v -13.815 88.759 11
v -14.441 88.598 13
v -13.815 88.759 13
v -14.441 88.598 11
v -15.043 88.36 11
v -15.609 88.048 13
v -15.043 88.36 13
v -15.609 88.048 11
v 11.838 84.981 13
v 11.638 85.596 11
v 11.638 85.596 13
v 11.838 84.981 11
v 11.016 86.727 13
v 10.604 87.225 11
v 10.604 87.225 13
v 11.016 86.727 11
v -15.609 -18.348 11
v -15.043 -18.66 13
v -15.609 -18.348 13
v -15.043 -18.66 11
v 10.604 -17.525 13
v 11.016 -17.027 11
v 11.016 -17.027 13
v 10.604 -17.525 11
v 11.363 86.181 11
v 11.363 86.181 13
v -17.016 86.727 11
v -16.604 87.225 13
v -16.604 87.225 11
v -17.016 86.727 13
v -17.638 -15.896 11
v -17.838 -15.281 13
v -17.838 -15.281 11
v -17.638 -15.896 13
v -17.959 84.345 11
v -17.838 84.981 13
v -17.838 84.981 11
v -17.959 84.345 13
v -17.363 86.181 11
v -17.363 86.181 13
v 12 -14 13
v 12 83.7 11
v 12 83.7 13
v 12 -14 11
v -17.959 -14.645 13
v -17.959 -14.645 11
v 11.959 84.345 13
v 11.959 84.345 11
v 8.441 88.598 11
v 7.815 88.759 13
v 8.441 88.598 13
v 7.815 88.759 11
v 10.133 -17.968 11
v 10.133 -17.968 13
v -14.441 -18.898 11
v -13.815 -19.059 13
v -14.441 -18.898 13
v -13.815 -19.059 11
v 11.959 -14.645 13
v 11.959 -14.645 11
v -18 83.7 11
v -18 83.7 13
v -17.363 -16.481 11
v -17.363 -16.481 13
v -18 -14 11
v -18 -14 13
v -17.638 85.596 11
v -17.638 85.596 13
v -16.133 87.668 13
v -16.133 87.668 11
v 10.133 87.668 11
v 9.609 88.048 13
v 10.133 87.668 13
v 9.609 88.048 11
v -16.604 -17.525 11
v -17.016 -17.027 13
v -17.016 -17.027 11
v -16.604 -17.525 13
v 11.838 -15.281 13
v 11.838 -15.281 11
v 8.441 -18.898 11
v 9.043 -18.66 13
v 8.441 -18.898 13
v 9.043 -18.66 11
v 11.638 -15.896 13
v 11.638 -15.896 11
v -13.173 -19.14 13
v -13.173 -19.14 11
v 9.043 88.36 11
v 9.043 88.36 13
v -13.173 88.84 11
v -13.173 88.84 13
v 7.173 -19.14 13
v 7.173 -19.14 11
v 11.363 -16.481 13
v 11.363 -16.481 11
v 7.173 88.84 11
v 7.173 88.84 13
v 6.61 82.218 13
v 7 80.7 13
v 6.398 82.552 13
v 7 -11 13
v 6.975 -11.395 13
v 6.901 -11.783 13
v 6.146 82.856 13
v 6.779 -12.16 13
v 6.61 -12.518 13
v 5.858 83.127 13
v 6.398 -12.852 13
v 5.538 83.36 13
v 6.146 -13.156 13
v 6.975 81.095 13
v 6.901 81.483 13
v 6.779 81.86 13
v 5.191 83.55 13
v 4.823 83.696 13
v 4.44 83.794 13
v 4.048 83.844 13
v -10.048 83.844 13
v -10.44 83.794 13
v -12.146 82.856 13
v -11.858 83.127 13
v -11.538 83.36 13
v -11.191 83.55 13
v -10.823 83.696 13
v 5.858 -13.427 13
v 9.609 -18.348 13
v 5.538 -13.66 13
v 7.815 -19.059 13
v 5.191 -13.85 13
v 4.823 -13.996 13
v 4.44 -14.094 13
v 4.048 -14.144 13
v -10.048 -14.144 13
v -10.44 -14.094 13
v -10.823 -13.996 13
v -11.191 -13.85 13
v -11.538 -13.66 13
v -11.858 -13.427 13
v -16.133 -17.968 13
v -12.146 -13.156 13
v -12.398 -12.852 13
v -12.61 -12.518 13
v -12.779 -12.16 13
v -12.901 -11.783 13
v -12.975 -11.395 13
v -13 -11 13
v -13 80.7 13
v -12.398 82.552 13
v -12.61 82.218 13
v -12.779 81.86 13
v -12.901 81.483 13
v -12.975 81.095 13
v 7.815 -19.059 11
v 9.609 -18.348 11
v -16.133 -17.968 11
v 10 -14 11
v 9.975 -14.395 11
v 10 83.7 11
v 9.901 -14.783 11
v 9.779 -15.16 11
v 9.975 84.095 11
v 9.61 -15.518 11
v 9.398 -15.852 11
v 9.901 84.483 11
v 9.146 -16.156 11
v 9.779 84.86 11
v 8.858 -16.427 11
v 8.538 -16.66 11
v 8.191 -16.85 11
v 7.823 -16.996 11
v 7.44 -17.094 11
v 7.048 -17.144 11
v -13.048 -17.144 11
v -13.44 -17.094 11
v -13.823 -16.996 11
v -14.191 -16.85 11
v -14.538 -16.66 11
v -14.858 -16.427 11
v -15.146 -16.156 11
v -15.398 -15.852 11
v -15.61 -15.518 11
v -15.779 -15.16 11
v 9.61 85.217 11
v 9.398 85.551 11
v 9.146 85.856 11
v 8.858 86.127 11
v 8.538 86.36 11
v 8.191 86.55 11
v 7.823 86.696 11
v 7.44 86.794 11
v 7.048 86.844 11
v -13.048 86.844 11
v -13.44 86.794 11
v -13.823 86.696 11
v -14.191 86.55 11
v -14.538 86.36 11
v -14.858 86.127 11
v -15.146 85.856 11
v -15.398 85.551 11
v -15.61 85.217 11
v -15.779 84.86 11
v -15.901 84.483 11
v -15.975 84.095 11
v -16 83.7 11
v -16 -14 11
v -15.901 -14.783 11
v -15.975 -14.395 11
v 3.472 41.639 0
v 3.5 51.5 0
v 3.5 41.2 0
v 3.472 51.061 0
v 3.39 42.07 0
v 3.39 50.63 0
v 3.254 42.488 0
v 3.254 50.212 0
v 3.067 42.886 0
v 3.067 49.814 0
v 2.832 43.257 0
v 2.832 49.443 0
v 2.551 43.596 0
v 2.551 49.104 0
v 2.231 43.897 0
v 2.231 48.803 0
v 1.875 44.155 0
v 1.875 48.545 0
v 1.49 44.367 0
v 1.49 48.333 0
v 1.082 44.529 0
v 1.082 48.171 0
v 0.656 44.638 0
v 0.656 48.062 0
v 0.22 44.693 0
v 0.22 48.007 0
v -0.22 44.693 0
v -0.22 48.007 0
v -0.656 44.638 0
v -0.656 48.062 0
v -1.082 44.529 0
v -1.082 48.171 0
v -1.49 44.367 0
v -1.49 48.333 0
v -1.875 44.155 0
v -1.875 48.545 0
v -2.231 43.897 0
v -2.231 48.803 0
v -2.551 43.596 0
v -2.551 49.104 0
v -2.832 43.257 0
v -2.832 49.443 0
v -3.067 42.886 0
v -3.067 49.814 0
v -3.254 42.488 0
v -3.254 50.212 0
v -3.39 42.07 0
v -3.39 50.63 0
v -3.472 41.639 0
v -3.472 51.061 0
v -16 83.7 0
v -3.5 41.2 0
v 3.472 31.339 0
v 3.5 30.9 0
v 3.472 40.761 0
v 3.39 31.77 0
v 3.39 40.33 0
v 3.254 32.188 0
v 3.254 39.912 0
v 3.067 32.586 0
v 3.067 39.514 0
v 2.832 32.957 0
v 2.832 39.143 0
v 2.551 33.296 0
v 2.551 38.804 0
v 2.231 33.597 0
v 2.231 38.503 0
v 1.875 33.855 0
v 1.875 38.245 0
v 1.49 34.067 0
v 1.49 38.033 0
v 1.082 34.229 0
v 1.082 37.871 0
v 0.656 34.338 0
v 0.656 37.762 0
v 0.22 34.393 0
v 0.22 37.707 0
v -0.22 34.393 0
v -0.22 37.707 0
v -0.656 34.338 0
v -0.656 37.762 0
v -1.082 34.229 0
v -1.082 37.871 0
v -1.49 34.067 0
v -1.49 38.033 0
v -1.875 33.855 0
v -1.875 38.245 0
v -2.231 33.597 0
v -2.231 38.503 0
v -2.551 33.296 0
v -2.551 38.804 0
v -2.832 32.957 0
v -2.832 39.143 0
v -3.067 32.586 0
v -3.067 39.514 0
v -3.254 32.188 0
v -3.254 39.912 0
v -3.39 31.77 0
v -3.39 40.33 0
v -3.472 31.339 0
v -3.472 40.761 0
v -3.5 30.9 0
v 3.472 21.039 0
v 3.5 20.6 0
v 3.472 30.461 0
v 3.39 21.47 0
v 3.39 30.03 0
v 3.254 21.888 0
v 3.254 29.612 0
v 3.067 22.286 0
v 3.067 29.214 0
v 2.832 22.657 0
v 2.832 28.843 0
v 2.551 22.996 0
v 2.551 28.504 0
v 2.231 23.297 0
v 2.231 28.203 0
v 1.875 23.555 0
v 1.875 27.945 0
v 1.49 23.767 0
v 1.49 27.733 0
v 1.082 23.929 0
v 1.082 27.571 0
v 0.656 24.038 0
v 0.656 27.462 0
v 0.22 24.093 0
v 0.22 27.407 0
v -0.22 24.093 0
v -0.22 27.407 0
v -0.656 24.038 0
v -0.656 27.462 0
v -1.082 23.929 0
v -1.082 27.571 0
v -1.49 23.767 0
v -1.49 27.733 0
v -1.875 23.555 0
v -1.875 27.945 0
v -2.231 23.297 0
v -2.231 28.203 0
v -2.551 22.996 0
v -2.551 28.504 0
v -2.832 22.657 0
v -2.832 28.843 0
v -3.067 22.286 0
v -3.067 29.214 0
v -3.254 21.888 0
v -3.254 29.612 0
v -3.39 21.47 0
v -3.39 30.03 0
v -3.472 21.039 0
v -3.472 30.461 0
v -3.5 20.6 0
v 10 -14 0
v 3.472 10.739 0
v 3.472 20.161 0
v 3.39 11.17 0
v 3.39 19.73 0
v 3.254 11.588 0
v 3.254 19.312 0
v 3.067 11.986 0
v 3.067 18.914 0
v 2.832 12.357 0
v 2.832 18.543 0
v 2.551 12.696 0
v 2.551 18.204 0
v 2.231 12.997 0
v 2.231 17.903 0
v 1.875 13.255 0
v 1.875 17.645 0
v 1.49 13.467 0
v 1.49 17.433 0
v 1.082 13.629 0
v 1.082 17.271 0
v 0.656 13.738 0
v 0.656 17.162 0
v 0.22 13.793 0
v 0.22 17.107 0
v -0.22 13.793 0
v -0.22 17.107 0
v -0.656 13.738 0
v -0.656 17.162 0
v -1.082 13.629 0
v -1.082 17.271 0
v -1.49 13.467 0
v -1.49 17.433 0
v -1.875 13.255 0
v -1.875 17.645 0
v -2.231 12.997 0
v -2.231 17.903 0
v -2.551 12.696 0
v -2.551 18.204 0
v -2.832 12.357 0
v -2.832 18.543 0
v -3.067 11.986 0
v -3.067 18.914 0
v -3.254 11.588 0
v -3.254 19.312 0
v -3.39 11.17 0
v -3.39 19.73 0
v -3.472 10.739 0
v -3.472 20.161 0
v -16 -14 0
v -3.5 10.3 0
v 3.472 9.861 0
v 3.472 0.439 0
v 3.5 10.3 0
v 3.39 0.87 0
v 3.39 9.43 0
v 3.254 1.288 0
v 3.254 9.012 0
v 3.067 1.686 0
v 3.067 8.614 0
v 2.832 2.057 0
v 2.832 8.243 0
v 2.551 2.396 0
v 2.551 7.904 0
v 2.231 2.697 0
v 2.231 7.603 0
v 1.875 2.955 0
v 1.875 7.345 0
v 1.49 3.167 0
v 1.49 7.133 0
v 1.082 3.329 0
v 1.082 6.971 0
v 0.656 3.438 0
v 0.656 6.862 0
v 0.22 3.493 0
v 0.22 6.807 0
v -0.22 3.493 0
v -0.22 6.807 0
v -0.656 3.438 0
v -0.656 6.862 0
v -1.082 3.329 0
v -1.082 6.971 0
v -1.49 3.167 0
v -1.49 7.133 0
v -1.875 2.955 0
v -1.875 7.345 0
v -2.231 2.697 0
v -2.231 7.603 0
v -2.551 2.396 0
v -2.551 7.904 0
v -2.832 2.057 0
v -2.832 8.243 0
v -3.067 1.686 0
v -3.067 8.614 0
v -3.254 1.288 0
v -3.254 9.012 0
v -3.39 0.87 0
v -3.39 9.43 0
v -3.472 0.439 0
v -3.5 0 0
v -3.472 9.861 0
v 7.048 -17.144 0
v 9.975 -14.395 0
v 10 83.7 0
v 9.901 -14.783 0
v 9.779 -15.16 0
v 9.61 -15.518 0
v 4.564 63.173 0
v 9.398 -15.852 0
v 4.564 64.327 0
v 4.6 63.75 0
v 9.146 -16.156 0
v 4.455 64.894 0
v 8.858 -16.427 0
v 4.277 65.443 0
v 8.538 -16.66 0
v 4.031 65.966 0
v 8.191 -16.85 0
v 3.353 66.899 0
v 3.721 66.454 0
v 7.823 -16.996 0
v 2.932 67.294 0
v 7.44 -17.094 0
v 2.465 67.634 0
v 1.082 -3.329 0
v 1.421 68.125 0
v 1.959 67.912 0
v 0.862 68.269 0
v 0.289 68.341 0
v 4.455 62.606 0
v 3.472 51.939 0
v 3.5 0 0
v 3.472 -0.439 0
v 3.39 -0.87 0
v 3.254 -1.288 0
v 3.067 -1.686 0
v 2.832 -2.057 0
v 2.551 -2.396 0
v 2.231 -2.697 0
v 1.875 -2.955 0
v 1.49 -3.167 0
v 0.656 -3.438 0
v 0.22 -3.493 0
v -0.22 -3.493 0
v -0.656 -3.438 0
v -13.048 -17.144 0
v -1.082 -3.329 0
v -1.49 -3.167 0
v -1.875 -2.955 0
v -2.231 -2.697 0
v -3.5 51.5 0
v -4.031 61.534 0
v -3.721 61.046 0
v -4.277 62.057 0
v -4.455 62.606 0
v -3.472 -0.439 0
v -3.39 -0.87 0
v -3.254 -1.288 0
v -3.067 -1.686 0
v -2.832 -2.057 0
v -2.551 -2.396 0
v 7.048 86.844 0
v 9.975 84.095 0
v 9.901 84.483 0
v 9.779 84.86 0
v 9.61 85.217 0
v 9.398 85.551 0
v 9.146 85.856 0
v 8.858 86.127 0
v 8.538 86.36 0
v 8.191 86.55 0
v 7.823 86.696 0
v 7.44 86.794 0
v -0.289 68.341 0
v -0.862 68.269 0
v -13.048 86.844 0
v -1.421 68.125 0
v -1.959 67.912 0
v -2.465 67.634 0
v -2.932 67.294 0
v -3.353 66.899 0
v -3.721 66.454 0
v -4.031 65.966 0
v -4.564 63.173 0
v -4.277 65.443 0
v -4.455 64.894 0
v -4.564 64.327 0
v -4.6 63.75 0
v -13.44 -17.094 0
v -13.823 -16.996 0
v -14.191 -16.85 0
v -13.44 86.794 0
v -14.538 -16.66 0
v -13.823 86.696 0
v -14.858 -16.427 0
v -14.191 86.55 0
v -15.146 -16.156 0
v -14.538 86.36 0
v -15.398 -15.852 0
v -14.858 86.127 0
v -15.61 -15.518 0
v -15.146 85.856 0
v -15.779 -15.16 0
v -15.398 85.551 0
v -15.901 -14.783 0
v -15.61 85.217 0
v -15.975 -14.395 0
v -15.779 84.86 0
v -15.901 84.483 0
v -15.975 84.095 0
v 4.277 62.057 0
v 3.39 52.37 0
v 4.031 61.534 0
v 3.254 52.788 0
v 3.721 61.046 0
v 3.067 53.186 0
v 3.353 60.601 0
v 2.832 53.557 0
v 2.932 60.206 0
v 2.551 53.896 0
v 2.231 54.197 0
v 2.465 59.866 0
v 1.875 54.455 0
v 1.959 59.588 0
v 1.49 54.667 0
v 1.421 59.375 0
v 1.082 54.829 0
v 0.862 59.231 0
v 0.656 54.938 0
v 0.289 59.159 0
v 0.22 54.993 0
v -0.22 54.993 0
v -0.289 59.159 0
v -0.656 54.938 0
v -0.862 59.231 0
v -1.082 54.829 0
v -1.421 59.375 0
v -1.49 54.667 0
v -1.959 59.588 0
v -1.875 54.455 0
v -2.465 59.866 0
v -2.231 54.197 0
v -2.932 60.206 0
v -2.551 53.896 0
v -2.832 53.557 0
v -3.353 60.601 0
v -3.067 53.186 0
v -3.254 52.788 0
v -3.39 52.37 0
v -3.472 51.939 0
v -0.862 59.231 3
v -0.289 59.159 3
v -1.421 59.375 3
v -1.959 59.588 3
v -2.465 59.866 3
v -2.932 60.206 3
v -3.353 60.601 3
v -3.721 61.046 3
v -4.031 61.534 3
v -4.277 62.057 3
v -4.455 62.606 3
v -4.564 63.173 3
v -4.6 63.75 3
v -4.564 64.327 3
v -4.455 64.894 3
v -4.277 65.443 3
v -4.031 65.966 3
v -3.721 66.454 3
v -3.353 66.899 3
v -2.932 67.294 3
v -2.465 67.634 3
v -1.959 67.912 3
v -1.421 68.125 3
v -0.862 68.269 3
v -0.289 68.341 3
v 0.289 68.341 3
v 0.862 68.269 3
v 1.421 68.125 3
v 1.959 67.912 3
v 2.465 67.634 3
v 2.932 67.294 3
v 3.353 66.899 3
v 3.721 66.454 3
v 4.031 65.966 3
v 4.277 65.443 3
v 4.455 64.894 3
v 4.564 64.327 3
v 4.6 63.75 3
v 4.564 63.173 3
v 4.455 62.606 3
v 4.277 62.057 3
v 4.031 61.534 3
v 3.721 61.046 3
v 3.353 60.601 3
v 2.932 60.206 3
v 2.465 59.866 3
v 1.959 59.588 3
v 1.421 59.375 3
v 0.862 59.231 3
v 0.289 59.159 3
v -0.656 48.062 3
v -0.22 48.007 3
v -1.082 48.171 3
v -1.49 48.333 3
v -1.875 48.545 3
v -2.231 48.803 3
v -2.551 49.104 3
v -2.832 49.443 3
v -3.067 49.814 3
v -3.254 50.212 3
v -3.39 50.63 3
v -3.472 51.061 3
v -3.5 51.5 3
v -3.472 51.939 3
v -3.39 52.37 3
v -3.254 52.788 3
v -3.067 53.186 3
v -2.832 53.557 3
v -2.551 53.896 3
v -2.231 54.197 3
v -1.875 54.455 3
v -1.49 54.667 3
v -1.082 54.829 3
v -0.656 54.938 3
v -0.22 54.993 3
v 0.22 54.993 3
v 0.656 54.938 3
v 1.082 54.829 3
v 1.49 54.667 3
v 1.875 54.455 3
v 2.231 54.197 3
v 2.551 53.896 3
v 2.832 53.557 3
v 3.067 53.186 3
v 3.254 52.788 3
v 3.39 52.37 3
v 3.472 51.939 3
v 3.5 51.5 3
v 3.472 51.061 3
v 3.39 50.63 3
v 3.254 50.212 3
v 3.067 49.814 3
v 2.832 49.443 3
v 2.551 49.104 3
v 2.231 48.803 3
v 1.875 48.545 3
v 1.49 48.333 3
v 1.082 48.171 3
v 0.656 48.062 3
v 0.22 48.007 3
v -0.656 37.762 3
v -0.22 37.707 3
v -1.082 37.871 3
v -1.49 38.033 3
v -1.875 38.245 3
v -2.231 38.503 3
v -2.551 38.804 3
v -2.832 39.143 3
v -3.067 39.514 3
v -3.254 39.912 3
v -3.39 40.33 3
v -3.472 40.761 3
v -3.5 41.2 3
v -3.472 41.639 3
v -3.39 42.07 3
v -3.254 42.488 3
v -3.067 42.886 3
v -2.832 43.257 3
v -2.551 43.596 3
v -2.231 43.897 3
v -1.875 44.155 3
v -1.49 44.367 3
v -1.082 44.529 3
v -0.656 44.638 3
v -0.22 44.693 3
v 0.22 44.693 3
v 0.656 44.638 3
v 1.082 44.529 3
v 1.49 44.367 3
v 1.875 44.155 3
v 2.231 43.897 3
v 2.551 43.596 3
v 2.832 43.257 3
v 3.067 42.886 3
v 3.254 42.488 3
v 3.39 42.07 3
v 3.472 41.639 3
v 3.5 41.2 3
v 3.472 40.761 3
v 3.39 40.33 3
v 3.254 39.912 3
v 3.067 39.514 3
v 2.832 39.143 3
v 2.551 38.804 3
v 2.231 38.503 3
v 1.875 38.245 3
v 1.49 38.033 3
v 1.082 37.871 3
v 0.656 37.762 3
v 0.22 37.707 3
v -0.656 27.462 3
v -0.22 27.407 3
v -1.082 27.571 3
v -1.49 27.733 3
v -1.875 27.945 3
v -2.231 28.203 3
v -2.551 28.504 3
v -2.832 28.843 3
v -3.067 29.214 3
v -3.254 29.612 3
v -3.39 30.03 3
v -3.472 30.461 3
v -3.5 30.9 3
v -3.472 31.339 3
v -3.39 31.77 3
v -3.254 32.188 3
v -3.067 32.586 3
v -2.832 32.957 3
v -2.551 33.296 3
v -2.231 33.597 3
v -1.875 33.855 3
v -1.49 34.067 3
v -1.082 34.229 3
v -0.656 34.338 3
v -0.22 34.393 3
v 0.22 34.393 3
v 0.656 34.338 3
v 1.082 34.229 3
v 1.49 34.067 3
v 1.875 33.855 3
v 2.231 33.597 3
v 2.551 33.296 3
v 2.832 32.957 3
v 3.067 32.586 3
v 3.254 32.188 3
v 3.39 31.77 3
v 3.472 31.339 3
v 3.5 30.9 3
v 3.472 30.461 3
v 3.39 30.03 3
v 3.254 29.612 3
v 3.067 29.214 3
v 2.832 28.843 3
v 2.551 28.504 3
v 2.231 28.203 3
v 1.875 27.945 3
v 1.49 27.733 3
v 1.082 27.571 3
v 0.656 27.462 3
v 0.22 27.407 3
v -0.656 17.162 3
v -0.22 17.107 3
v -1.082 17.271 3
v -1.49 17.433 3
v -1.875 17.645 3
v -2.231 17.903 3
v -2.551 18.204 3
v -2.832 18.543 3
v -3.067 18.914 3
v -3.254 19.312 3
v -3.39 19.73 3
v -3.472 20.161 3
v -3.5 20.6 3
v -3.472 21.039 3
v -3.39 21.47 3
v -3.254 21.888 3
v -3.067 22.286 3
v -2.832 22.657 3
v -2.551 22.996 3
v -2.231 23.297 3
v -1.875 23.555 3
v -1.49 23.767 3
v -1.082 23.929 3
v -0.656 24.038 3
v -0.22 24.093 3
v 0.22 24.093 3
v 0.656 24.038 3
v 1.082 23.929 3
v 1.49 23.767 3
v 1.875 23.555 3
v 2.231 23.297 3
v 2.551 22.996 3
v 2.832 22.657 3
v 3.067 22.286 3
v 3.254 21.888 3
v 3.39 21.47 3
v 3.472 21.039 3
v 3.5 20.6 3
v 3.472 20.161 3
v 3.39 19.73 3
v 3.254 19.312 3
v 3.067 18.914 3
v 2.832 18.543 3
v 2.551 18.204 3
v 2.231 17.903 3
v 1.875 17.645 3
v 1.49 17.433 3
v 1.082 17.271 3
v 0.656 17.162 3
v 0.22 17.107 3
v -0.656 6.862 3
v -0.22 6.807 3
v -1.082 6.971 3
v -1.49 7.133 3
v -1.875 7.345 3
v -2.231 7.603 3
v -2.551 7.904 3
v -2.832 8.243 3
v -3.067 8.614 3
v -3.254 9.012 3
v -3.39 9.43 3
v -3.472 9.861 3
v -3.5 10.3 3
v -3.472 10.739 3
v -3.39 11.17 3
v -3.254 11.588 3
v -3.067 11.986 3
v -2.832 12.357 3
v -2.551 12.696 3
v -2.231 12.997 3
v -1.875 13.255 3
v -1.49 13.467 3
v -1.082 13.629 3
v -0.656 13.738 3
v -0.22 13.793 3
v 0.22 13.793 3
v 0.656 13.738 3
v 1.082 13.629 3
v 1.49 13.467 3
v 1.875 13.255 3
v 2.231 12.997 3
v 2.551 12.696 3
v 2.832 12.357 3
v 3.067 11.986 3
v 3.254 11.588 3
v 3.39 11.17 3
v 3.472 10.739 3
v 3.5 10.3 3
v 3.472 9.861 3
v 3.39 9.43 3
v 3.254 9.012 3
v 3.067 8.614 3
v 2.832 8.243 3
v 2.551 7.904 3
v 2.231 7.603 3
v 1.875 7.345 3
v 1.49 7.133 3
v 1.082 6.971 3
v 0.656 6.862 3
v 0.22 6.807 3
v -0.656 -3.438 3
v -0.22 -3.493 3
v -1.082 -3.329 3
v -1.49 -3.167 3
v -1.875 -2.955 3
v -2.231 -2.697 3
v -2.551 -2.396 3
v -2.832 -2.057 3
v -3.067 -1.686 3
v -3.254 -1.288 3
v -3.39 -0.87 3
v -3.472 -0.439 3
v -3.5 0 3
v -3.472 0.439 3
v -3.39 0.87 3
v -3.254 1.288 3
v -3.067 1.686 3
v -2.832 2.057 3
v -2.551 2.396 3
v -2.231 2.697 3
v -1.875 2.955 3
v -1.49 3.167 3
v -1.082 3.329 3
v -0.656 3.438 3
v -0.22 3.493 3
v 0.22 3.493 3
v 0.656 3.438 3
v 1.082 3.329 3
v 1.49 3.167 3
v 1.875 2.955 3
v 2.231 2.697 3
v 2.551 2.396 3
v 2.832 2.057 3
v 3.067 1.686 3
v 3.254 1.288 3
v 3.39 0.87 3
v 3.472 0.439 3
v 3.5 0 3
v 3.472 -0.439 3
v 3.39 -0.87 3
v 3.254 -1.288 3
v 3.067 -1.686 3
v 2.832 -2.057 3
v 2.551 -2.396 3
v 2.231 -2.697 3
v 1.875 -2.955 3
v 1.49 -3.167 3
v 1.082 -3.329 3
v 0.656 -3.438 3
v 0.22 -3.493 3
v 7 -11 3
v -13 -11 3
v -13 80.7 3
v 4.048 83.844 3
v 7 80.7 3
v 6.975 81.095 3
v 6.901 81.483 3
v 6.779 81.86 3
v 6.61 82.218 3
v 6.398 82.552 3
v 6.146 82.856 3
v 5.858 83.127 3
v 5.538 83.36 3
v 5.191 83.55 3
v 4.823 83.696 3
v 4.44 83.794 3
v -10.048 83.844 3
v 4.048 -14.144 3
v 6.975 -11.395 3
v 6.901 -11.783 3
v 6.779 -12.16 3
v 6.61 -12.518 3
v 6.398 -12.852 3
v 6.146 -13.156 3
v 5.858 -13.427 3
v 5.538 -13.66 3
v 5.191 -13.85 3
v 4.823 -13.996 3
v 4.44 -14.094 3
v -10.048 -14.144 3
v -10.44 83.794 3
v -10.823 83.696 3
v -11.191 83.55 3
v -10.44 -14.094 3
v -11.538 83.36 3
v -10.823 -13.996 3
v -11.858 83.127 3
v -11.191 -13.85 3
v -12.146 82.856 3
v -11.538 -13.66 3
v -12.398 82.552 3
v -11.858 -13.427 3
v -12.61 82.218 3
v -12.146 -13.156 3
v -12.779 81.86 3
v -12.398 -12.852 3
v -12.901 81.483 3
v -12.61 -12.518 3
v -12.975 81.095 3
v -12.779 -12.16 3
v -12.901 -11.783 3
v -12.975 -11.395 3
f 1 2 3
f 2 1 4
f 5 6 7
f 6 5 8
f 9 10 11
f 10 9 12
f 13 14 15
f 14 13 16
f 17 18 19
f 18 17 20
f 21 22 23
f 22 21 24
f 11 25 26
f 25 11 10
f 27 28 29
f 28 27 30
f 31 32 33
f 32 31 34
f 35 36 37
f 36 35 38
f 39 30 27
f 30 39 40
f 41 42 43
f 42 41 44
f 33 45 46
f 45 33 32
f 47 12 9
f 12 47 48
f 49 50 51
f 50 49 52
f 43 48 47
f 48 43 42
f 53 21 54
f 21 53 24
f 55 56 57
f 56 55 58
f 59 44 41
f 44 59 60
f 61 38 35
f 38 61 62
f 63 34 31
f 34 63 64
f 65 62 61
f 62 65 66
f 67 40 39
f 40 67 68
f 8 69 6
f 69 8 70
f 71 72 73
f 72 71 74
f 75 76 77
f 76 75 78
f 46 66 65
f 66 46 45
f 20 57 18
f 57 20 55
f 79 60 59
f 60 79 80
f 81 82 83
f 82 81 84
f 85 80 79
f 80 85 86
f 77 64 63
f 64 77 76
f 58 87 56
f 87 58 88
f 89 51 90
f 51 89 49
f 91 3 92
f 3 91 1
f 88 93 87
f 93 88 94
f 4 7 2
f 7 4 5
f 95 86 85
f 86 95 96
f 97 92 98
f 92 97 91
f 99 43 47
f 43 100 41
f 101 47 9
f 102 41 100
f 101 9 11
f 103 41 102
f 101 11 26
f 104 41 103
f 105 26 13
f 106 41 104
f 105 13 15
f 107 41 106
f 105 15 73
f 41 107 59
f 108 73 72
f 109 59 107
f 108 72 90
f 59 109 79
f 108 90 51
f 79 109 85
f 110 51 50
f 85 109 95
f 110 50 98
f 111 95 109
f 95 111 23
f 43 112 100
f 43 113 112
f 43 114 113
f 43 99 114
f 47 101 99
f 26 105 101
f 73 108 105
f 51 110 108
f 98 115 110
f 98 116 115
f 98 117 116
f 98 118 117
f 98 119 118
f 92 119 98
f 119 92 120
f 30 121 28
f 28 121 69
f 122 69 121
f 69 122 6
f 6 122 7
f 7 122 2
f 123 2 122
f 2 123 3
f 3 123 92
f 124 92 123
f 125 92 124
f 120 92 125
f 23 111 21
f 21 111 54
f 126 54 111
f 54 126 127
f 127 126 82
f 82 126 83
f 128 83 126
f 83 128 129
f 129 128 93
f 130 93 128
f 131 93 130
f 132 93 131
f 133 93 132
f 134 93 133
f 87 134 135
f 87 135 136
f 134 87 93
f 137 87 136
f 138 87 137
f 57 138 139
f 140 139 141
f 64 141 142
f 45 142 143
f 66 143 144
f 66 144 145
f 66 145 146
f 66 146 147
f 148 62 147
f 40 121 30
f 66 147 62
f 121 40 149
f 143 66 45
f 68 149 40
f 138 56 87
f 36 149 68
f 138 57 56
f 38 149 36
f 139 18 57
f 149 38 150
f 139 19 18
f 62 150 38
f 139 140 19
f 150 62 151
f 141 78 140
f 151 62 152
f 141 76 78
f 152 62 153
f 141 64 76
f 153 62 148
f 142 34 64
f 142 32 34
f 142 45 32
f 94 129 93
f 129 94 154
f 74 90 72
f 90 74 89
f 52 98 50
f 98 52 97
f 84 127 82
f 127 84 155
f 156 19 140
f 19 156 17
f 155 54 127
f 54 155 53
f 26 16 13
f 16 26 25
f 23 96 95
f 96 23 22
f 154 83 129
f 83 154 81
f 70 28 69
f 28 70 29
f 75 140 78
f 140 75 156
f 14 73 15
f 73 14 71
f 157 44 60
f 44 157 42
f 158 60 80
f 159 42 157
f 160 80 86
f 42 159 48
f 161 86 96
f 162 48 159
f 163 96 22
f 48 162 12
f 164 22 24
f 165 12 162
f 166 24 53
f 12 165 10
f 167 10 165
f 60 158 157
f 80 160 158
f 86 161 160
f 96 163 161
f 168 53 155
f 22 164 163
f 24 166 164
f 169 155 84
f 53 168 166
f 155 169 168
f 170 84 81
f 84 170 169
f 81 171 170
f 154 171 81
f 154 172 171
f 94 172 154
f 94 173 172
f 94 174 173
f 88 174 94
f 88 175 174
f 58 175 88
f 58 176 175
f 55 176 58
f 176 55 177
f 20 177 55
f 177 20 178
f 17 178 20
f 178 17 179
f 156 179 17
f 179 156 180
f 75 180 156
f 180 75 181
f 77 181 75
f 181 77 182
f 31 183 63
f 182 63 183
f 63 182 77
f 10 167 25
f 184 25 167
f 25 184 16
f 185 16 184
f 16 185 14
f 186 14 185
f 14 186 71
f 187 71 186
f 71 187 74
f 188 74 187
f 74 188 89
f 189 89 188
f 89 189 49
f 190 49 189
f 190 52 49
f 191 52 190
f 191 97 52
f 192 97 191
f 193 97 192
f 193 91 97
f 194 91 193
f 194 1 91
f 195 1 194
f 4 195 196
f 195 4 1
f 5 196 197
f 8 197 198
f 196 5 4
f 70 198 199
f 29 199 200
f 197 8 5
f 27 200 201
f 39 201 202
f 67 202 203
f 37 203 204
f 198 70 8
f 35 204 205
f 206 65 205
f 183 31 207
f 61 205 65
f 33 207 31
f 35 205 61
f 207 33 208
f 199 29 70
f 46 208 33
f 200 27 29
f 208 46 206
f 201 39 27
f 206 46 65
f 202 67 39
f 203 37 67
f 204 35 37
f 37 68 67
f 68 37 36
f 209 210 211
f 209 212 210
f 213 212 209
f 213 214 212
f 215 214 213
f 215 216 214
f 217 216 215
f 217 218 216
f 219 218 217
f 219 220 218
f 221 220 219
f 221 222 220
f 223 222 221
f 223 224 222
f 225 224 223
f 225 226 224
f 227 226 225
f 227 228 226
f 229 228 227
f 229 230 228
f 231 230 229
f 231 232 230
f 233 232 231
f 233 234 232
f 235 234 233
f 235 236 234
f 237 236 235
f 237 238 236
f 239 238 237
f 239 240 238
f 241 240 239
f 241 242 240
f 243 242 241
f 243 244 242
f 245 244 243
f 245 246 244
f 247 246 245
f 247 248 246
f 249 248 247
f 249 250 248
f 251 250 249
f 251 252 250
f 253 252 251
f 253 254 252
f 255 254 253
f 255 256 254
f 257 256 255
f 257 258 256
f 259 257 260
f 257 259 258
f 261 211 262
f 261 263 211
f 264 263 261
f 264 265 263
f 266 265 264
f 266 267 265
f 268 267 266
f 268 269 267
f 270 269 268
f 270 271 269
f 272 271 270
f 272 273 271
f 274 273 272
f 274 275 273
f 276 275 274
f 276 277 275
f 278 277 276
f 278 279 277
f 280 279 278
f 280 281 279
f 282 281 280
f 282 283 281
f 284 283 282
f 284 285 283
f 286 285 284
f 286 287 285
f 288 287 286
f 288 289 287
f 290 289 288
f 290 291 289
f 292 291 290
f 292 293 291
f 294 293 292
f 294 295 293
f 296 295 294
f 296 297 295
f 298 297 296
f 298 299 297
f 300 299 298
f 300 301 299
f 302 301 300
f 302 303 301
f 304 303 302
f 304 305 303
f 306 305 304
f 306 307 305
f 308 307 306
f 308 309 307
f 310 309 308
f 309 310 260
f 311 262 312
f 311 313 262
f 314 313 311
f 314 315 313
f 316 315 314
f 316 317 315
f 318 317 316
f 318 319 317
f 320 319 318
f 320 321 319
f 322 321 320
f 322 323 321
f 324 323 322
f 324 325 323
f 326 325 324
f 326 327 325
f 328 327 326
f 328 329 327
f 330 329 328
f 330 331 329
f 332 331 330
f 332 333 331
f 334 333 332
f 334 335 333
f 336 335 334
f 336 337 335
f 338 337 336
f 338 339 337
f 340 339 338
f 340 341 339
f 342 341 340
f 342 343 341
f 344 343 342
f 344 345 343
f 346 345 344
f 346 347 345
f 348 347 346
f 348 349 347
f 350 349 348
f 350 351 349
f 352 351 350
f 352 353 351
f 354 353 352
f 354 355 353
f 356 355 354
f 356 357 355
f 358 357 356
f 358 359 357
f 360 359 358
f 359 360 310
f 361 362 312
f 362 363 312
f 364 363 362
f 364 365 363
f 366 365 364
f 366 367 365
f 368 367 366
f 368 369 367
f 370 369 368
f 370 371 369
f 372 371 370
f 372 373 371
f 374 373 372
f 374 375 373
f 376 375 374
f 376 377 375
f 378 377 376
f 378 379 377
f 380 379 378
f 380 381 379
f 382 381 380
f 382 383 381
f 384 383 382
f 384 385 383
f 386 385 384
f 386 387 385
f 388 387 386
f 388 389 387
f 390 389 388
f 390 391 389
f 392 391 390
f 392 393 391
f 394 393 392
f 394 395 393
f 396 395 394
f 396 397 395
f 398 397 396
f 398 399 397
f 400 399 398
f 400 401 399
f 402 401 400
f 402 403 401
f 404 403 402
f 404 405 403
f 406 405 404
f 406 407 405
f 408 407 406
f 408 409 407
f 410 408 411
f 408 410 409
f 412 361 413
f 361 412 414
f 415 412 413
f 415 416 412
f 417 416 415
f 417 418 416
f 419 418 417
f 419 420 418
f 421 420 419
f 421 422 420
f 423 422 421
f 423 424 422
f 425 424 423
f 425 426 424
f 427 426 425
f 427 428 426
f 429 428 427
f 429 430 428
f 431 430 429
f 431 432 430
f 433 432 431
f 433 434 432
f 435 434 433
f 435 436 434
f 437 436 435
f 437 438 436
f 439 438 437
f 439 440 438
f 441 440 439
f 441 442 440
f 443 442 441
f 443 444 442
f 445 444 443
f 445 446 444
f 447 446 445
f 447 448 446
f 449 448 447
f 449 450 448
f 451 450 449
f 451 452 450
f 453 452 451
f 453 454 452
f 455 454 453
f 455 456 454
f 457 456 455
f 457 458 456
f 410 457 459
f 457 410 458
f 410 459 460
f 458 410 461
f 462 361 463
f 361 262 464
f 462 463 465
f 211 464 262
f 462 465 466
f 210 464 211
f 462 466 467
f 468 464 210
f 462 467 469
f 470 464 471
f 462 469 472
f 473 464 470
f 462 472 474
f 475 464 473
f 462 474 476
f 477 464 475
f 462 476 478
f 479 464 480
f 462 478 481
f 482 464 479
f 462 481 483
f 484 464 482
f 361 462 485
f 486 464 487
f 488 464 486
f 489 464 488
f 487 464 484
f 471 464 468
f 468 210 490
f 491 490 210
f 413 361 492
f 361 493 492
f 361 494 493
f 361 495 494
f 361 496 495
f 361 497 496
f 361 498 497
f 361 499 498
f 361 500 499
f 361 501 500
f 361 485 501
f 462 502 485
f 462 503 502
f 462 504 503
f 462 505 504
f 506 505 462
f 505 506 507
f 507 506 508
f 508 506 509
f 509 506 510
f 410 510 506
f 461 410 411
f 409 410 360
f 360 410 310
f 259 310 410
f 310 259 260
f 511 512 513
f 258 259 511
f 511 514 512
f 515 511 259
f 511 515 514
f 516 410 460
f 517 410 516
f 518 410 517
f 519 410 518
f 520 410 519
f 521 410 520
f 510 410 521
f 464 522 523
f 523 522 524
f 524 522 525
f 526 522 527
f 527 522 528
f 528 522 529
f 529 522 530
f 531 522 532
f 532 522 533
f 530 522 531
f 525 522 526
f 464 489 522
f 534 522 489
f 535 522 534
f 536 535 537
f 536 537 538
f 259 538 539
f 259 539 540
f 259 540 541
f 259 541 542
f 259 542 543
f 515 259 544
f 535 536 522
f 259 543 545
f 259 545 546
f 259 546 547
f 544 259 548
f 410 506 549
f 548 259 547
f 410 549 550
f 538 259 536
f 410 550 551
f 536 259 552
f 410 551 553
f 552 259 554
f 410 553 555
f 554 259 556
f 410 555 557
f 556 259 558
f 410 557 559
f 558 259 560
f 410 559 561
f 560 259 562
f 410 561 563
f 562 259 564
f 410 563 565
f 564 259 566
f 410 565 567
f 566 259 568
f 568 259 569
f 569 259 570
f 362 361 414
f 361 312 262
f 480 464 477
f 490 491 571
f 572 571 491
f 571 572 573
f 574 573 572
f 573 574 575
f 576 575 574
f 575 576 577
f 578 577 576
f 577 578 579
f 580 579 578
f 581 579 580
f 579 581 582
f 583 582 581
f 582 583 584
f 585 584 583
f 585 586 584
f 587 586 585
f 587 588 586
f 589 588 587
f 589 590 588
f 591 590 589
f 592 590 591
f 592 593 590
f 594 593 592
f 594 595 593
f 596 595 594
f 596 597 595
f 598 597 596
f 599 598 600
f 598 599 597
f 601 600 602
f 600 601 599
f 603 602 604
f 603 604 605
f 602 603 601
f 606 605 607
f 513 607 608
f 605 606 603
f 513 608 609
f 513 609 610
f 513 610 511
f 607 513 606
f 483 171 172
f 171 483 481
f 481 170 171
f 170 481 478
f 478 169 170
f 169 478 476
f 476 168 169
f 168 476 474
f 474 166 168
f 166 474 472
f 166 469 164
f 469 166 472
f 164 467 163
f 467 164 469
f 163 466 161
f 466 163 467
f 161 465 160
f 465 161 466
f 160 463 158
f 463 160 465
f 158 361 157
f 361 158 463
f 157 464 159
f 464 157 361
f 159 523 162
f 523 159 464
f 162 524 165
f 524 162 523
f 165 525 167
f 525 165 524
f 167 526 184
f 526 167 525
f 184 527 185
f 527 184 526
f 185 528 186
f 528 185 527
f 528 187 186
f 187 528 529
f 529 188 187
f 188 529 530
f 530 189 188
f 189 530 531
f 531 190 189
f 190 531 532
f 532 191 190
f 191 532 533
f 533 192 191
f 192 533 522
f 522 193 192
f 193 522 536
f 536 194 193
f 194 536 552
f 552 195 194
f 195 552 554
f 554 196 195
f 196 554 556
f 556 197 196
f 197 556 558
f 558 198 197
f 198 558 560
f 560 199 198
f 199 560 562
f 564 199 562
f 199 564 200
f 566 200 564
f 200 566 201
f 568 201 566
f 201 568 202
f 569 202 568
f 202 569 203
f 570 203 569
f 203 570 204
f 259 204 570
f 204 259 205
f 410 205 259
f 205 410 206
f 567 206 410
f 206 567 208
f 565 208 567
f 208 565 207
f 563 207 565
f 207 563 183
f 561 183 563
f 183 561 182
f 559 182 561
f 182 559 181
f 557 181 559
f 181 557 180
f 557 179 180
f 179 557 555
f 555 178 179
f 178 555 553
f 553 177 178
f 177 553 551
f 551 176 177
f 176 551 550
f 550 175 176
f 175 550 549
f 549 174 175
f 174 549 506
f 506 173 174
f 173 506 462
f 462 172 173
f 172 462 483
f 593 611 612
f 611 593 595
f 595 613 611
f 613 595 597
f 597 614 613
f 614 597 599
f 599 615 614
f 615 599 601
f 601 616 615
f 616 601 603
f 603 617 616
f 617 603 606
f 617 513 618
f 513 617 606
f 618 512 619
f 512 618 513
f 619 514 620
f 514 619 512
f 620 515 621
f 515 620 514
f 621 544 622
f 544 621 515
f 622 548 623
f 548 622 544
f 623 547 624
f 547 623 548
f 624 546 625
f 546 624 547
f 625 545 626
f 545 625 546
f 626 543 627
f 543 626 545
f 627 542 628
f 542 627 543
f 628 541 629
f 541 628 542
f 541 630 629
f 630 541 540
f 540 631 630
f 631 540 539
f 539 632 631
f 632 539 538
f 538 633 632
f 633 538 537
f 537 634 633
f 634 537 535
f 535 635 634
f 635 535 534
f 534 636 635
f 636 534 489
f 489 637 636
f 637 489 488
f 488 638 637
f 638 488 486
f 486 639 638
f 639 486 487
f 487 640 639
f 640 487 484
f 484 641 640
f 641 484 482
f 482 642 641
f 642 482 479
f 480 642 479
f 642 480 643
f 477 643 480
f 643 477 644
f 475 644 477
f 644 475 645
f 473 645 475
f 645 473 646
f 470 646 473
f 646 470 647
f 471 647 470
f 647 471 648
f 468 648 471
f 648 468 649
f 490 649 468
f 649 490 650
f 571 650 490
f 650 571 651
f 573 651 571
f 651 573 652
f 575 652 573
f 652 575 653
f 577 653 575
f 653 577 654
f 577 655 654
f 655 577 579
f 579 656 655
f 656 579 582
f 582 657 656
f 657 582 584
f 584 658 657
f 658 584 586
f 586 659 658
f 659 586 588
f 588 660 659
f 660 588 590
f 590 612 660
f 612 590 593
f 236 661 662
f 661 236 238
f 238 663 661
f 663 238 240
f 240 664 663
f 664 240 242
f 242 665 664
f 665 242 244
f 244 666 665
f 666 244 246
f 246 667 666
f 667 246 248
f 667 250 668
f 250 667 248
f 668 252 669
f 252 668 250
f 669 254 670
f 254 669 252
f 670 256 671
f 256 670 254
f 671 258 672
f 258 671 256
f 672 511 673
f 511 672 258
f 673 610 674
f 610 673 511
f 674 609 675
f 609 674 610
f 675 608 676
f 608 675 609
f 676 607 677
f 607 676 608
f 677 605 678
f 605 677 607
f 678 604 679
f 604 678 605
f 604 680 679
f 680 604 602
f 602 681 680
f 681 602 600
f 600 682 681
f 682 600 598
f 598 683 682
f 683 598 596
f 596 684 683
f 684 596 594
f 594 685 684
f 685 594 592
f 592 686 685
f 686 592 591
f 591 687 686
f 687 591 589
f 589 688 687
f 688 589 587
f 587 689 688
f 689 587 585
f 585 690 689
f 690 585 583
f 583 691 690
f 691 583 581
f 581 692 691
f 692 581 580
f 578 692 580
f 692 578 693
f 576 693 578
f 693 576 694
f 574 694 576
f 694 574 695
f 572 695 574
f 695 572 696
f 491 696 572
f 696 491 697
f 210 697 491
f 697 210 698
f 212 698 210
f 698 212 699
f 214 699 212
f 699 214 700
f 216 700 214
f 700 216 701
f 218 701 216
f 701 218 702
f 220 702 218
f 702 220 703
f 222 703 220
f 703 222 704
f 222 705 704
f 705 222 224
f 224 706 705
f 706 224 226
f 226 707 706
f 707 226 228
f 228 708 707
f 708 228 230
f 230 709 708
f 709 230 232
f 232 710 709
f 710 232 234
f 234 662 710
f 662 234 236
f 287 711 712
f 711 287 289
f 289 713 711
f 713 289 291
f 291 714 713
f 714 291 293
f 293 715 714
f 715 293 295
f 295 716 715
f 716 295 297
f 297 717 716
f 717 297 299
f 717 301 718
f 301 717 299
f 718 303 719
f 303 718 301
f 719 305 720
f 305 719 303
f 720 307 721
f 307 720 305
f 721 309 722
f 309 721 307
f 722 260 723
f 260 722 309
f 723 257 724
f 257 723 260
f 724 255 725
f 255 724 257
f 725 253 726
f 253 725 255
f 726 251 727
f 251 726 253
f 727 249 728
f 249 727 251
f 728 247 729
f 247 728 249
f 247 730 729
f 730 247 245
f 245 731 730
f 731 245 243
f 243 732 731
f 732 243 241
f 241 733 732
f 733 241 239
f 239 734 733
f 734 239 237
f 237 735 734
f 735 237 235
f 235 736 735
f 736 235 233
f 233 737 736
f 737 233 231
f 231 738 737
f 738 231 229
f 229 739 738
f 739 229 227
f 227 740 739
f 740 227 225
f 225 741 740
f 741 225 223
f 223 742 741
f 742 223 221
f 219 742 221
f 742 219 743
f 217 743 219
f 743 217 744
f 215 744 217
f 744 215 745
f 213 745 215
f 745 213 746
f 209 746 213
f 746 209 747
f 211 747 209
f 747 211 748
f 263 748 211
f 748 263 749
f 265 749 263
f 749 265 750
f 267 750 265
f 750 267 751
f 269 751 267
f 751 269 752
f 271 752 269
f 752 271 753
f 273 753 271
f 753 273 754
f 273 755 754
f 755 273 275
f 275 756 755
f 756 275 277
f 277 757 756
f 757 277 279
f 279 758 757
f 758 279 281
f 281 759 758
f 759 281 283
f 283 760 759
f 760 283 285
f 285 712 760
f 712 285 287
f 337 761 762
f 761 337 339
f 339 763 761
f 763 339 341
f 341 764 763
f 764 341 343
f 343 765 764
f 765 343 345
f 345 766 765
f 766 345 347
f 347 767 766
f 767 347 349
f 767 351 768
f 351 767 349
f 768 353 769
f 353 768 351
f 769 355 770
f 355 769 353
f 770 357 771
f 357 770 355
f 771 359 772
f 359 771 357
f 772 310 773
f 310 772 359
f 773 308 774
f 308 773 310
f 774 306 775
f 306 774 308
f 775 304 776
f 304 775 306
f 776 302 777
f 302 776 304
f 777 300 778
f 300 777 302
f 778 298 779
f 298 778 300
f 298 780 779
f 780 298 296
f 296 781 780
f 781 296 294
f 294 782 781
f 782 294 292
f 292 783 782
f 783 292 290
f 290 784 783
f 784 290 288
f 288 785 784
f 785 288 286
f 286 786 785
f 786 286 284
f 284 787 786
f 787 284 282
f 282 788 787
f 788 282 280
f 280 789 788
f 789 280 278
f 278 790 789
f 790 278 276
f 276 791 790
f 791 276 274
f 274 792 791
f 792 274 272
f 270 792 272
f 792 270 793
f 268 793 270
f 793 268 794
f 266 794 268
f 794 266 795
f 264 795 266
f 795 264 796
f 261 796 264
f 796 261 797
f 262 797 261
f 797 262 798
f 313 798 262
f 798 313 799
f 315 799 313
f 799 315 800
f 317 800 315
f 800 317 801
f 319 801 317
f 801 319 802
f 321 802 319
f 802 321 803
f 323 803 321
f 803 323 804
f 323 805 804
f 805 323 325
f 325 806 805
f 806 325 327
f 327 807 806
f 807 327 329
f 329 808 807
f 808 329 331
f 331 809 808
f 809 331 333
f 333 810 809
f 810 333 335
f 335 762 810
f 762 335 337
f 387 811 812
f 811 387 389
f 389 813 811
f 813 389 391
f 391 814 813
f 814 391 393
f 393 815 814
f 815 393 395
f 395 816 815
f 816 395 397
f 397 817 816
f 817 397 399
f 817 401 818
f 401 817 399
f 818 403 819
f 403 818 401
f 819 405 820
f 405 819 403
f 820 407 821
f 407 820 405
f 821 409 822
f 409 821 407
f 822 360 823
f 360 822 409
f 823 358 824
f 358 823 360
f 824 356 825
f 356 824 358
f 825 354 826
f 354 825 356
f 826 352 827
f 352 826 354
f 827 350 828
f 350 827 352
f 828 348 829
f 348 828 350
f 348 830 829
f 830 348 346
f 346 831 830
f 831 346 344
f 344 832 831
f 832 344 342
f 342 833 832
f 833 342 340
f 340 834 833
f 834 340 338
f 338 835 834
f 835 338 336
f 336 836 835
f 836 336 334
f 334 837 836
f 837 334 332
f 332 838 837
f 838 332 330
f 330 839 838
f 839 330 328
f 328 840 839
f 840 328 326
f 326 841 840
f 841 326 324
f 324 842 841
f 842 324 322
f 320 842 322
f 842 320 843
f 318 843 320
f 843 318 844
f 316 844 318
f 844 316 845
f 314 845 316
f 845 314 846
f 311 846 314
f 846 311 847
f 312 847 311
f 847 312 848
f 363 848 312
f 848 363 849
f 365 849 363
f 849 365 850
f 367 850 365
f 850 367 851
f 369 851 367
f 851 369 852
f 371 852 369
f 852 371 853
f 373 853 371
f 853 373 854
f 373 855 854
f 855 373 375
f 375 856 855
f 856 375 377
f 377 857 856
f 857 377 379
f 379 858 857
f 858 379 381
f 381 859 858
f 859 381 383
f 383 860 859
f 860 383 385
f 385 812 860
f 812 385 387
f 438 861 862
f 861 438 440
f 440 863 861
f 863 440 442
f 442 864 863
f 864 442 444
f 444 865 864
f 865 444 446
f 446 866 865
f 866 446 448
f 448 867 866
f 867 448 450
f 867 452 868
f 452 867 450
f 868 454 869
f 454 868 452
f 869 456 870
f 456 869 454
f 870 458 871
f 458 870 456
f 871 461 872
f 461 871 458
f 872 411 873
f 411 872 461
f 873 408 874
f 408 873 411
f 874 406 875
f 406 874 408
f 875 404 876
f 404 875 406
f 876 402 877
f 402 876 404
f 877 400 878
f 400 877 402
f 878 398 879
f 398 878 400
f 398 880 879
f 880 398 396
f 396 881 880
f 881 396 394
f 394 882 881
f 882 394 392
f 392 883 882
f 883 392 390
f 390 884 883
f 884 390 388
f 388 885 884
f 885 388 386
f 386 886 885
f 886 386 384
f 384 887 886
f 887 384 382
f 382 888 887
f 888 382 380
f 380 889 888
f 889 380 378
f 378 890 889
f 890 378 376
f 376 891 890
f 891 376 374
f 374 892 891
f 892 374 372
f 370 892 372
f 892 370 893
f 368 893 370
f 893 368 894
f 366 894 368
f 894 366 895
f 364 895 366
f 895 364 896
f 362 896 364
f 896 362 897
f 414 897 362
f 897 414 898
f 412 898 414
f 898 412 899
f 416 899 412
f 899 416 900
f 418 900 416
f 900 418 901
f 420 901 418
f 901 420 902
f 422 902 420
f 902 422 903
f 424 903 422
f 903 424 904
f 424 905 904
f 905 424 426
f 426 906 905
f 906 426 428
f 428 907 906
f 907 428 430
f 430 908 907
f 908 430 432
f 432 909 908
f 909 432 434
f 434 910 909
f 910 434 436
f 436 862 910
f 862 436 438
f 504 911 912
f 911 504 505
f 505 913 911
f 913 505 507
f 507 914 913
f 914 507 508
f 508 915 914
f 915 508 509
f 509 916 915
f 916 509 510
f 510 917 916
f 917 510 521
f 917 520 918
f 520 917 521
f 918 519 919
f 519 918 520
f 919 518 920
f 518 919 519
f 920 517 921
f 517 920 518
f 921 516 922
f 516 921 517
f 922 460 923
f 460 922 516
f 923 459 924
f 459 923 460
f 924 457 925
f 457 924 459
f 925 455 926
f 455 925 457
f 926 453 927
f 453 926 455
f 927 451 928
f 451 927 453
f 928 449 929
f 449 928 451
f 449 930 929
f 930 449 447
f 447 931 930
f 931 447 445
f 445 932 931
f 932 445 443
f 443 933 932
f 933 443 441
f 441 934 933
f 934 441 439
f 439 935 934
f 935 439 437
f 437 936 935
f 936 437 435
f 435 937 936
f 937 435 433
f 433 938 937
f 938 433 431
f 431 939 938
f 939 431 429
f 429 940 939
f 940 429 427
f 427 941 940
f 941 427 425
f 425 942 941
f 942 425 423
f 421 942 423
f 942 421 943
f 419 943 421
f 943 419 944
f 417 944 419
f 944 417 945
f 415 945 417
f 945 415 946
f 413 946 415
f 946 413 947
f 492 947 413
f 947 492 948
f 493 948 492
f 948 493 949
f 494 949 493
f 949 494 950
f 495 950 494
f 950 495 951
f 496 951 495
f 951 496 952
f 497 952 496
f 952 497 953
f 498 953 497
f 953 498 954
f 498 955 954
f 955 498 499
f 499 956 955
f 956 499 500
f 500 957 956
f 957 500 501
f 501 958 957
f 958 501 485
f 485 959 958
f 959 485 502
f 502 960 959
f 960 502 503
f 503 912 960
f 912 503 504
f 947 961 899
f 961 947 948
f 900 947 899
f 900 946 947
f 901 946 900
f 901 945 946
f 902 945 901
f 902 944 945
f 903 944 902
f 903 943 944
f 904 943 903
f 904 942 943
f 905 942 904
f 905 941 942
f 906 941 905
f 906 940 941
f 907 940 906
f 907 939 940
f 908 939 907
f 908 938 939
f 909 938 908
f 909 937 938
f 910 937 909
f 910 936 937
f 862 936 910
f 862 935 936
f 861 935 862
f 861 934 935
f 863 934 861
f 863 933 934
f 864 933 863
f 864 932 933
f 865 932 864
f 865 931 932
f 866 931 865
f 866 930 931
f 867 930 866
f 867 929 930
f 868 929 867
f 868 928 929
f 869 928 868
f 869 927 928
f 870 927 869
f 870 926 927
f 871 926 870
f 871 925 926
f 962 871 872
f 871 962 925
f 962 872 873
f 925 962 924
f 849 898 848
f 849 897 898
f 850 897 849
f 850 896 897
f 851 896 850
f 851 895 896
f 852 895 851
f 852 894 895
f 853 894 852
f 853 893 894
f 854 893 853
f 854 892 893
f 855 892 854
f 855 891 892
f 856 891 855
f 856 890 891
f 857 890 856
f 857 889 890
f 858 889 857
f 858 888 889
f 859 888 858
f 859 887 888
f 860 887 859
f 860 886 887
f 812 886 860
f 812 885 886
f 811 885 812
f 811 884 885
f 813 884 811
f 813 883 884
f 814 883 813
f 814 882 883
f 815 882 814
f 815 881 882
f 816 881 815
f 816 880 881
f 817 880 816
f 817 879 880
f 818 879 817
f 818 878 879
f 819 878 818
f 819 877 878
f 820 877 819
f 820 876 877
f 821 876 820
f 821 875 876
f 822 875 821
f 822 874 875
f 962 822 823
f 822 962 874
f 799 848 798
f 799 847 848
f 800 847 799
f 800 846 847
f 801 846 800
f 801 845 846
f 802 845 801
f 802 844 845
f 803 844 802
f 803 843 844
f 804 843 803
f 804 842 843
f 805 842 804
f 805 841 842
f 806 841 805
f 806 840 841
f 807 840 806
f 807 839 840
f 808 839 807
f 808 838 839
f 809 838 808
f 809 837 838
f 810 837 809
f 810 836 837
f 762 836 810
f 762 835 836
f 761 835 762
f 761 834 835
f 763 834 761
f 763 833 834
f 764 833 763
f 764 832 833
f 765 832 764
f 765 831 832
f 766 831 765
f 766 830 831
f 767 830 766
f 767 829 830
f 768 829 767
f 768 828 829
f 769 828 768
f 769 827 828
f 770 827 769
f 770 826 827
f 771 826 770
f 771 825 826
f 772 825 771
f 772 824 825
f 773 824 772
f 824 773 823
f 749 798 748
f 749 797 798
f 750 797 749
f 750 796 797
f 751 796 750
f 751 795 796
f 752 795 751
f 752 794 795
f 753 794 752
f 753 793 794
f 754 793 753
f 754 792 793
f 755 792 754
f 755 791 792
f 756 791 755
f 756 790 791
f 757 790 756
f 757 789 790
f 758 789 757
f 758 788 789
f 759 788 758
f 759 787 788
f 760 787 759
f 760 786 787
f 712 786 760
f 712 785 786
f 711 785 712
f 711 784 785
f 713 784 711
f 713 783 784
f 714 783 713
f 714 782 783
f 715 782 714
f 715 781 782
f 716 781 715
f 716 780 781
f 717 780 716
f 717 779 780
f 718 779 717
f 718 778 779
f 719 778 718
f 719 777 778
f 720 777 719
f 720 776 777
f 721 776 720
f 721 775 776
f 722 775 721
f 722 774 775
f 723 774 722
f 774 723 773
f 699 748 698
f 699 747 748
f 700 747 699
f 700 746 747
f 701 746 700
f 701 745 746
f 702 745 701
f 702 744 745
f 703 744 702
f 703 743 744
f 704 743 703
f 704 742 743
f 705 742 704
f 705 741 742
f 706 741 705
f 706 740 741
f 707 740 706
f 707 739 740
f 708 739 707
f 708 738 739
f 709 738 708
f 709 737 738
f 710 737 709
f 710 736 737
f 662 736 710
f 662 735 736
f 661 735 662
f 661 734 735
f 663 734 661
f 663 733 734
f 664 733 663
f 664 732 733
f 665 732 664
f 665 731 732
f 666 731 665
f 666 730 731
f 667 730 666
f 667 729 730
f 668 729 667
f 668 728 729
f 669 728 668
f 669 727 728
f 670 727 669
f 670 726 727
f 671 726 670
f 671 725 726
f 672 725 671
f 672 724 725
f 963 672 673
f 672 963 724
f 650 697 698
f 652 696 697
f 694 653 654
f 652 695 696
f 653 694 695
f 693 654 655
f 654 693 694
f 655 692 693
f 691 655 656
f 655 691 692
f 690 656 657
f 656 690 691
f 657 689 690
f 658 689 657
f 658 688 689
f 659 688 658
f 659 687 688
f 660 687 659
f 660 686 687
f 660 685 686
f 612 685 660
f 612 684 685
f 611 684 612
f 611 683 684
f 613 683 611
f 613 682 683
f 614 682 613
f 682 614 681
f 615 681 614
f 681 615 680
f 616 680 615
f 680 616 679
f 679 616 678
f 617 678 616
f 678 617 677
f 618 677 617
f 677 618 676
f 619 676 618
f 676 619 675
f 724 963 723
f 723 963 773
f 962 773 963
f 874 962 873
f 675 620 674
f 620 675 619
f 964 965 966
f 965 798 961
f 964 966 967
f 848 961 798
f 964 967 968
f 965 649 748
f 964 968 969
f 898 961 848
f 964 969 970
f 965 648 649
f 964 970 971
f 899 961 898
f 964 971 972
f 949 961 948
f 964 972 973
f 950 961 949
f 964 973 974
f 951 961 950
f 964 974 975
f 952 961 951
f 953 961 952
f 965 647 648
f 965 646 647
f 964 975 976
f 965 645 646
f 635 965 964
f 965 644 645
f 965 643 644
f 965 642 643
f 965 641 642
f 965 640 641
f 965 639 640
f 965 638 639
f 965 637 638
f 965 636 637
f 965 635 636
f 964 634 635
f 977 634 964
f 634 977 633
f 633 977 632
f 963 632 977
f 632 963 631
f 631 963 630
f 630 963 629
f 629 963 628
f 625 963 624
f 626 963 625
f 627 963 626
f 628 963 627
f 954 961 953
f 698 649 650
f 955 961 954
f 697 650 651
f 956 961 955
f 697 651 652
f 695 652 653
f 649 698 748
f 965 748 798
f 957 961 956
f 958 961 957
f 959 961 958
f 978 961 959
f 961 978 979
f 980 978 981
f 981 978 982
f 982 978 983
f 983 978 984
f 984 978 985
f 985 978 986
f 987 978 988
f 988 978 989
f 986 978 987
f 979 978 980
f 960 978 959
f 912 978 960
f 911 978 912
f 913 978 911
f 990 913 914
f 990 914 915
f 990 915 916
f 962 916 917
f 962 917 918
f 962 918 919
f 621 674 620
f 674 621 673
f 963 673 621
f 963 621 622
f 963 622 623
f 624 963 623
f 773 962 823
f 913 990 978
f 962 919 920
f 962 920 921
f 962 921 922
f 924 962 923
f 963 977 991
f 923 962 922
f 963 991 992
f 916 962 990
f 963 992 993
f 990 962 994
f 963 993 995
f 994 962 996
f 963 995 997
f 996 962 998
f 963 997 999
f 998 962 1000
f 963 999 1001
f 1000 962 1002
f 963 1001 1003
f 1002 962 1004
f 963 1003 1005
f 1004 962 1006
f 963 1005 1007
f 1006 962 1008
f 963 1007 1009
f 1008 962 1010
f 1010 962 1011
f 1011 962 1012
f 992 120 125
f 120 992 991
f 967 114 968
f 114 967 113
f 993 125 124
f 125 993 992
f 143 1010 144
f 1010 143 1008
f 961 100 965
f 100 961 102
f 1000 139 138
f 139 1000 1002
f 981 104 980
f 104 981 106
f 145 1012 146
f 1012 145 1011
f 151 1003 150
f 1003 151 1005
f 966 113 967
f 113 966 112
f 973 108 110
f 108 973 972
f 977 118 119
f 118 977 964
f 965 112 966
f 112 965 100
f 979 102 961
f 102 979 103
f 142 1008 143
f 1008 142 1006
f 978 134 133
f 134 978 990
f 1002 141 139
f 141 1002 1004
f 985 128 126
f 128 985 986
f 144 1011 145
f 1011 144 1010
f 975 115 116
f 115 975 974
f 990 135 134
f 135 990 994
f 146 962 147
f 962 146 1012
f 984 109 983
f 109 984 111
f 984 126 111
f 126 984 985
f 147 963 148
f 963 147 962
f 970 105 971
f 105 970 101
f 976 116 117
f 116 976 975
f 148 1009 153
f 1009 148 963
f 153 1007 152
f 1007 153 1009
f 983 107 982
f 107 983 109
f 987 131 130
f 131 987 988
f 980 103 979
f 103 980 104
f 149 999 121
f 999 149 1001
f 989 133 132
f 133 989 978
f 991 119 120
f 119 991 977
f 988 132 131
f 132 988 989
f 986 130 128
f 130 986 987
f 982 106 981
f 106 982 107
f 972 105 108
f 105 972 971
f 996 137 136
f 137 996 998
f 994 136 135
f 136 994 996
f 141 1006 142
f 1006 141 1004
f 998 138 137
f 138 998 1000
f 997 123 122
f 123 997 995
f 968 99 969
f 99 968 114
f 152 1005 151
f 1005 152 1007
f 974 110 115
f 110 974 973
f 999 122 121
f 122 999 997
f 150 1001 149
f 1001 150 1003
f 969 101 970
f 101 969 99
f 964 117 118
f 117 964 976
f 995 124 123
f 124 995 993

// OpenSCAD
$fn = 50;

small_l = 58.5;
small_d = 7;

step = (small_l - small_d) / 5;

big_d = 9.2;
big_dist = 4.15;
big_pos = [0, (step * 5) + big_dist + (big_d + small_d)/2];

thickness = 3;
circle_d = 6.3;
size = [20+2*thickness-circle_d, 98+2*thickness-circle_d];
size_inside = [size.x - 2*thickness, size.y - 2*thickness];
height=11;

echo(step);


difference() {
    union() {
        translate([-3, size.y/2-14, height])
        linear_extrude(height=2)
        body(size, circle_d+4);
    
        linear_extrude(height=height)
        difference() {
            translate([-3, size.y/2-14])
            body(size, circle_d);
            for(i = [0 : 5]) {
                echo(i);
                translate([0, step * i])
                circle(d=small_d);
            }
            
            translate(big_pos)
            circle(d=big_d);
        }
    };    

    translate([-3, size.y/2-14, thickness])
    linear_extrude(height=height)
    body(size_inside, circle_d);
}


module body(size, circle_d) {
    minkowski() {
        circle(d=circle_d);
        square([size.x, size.y], center=true);
    }
}
